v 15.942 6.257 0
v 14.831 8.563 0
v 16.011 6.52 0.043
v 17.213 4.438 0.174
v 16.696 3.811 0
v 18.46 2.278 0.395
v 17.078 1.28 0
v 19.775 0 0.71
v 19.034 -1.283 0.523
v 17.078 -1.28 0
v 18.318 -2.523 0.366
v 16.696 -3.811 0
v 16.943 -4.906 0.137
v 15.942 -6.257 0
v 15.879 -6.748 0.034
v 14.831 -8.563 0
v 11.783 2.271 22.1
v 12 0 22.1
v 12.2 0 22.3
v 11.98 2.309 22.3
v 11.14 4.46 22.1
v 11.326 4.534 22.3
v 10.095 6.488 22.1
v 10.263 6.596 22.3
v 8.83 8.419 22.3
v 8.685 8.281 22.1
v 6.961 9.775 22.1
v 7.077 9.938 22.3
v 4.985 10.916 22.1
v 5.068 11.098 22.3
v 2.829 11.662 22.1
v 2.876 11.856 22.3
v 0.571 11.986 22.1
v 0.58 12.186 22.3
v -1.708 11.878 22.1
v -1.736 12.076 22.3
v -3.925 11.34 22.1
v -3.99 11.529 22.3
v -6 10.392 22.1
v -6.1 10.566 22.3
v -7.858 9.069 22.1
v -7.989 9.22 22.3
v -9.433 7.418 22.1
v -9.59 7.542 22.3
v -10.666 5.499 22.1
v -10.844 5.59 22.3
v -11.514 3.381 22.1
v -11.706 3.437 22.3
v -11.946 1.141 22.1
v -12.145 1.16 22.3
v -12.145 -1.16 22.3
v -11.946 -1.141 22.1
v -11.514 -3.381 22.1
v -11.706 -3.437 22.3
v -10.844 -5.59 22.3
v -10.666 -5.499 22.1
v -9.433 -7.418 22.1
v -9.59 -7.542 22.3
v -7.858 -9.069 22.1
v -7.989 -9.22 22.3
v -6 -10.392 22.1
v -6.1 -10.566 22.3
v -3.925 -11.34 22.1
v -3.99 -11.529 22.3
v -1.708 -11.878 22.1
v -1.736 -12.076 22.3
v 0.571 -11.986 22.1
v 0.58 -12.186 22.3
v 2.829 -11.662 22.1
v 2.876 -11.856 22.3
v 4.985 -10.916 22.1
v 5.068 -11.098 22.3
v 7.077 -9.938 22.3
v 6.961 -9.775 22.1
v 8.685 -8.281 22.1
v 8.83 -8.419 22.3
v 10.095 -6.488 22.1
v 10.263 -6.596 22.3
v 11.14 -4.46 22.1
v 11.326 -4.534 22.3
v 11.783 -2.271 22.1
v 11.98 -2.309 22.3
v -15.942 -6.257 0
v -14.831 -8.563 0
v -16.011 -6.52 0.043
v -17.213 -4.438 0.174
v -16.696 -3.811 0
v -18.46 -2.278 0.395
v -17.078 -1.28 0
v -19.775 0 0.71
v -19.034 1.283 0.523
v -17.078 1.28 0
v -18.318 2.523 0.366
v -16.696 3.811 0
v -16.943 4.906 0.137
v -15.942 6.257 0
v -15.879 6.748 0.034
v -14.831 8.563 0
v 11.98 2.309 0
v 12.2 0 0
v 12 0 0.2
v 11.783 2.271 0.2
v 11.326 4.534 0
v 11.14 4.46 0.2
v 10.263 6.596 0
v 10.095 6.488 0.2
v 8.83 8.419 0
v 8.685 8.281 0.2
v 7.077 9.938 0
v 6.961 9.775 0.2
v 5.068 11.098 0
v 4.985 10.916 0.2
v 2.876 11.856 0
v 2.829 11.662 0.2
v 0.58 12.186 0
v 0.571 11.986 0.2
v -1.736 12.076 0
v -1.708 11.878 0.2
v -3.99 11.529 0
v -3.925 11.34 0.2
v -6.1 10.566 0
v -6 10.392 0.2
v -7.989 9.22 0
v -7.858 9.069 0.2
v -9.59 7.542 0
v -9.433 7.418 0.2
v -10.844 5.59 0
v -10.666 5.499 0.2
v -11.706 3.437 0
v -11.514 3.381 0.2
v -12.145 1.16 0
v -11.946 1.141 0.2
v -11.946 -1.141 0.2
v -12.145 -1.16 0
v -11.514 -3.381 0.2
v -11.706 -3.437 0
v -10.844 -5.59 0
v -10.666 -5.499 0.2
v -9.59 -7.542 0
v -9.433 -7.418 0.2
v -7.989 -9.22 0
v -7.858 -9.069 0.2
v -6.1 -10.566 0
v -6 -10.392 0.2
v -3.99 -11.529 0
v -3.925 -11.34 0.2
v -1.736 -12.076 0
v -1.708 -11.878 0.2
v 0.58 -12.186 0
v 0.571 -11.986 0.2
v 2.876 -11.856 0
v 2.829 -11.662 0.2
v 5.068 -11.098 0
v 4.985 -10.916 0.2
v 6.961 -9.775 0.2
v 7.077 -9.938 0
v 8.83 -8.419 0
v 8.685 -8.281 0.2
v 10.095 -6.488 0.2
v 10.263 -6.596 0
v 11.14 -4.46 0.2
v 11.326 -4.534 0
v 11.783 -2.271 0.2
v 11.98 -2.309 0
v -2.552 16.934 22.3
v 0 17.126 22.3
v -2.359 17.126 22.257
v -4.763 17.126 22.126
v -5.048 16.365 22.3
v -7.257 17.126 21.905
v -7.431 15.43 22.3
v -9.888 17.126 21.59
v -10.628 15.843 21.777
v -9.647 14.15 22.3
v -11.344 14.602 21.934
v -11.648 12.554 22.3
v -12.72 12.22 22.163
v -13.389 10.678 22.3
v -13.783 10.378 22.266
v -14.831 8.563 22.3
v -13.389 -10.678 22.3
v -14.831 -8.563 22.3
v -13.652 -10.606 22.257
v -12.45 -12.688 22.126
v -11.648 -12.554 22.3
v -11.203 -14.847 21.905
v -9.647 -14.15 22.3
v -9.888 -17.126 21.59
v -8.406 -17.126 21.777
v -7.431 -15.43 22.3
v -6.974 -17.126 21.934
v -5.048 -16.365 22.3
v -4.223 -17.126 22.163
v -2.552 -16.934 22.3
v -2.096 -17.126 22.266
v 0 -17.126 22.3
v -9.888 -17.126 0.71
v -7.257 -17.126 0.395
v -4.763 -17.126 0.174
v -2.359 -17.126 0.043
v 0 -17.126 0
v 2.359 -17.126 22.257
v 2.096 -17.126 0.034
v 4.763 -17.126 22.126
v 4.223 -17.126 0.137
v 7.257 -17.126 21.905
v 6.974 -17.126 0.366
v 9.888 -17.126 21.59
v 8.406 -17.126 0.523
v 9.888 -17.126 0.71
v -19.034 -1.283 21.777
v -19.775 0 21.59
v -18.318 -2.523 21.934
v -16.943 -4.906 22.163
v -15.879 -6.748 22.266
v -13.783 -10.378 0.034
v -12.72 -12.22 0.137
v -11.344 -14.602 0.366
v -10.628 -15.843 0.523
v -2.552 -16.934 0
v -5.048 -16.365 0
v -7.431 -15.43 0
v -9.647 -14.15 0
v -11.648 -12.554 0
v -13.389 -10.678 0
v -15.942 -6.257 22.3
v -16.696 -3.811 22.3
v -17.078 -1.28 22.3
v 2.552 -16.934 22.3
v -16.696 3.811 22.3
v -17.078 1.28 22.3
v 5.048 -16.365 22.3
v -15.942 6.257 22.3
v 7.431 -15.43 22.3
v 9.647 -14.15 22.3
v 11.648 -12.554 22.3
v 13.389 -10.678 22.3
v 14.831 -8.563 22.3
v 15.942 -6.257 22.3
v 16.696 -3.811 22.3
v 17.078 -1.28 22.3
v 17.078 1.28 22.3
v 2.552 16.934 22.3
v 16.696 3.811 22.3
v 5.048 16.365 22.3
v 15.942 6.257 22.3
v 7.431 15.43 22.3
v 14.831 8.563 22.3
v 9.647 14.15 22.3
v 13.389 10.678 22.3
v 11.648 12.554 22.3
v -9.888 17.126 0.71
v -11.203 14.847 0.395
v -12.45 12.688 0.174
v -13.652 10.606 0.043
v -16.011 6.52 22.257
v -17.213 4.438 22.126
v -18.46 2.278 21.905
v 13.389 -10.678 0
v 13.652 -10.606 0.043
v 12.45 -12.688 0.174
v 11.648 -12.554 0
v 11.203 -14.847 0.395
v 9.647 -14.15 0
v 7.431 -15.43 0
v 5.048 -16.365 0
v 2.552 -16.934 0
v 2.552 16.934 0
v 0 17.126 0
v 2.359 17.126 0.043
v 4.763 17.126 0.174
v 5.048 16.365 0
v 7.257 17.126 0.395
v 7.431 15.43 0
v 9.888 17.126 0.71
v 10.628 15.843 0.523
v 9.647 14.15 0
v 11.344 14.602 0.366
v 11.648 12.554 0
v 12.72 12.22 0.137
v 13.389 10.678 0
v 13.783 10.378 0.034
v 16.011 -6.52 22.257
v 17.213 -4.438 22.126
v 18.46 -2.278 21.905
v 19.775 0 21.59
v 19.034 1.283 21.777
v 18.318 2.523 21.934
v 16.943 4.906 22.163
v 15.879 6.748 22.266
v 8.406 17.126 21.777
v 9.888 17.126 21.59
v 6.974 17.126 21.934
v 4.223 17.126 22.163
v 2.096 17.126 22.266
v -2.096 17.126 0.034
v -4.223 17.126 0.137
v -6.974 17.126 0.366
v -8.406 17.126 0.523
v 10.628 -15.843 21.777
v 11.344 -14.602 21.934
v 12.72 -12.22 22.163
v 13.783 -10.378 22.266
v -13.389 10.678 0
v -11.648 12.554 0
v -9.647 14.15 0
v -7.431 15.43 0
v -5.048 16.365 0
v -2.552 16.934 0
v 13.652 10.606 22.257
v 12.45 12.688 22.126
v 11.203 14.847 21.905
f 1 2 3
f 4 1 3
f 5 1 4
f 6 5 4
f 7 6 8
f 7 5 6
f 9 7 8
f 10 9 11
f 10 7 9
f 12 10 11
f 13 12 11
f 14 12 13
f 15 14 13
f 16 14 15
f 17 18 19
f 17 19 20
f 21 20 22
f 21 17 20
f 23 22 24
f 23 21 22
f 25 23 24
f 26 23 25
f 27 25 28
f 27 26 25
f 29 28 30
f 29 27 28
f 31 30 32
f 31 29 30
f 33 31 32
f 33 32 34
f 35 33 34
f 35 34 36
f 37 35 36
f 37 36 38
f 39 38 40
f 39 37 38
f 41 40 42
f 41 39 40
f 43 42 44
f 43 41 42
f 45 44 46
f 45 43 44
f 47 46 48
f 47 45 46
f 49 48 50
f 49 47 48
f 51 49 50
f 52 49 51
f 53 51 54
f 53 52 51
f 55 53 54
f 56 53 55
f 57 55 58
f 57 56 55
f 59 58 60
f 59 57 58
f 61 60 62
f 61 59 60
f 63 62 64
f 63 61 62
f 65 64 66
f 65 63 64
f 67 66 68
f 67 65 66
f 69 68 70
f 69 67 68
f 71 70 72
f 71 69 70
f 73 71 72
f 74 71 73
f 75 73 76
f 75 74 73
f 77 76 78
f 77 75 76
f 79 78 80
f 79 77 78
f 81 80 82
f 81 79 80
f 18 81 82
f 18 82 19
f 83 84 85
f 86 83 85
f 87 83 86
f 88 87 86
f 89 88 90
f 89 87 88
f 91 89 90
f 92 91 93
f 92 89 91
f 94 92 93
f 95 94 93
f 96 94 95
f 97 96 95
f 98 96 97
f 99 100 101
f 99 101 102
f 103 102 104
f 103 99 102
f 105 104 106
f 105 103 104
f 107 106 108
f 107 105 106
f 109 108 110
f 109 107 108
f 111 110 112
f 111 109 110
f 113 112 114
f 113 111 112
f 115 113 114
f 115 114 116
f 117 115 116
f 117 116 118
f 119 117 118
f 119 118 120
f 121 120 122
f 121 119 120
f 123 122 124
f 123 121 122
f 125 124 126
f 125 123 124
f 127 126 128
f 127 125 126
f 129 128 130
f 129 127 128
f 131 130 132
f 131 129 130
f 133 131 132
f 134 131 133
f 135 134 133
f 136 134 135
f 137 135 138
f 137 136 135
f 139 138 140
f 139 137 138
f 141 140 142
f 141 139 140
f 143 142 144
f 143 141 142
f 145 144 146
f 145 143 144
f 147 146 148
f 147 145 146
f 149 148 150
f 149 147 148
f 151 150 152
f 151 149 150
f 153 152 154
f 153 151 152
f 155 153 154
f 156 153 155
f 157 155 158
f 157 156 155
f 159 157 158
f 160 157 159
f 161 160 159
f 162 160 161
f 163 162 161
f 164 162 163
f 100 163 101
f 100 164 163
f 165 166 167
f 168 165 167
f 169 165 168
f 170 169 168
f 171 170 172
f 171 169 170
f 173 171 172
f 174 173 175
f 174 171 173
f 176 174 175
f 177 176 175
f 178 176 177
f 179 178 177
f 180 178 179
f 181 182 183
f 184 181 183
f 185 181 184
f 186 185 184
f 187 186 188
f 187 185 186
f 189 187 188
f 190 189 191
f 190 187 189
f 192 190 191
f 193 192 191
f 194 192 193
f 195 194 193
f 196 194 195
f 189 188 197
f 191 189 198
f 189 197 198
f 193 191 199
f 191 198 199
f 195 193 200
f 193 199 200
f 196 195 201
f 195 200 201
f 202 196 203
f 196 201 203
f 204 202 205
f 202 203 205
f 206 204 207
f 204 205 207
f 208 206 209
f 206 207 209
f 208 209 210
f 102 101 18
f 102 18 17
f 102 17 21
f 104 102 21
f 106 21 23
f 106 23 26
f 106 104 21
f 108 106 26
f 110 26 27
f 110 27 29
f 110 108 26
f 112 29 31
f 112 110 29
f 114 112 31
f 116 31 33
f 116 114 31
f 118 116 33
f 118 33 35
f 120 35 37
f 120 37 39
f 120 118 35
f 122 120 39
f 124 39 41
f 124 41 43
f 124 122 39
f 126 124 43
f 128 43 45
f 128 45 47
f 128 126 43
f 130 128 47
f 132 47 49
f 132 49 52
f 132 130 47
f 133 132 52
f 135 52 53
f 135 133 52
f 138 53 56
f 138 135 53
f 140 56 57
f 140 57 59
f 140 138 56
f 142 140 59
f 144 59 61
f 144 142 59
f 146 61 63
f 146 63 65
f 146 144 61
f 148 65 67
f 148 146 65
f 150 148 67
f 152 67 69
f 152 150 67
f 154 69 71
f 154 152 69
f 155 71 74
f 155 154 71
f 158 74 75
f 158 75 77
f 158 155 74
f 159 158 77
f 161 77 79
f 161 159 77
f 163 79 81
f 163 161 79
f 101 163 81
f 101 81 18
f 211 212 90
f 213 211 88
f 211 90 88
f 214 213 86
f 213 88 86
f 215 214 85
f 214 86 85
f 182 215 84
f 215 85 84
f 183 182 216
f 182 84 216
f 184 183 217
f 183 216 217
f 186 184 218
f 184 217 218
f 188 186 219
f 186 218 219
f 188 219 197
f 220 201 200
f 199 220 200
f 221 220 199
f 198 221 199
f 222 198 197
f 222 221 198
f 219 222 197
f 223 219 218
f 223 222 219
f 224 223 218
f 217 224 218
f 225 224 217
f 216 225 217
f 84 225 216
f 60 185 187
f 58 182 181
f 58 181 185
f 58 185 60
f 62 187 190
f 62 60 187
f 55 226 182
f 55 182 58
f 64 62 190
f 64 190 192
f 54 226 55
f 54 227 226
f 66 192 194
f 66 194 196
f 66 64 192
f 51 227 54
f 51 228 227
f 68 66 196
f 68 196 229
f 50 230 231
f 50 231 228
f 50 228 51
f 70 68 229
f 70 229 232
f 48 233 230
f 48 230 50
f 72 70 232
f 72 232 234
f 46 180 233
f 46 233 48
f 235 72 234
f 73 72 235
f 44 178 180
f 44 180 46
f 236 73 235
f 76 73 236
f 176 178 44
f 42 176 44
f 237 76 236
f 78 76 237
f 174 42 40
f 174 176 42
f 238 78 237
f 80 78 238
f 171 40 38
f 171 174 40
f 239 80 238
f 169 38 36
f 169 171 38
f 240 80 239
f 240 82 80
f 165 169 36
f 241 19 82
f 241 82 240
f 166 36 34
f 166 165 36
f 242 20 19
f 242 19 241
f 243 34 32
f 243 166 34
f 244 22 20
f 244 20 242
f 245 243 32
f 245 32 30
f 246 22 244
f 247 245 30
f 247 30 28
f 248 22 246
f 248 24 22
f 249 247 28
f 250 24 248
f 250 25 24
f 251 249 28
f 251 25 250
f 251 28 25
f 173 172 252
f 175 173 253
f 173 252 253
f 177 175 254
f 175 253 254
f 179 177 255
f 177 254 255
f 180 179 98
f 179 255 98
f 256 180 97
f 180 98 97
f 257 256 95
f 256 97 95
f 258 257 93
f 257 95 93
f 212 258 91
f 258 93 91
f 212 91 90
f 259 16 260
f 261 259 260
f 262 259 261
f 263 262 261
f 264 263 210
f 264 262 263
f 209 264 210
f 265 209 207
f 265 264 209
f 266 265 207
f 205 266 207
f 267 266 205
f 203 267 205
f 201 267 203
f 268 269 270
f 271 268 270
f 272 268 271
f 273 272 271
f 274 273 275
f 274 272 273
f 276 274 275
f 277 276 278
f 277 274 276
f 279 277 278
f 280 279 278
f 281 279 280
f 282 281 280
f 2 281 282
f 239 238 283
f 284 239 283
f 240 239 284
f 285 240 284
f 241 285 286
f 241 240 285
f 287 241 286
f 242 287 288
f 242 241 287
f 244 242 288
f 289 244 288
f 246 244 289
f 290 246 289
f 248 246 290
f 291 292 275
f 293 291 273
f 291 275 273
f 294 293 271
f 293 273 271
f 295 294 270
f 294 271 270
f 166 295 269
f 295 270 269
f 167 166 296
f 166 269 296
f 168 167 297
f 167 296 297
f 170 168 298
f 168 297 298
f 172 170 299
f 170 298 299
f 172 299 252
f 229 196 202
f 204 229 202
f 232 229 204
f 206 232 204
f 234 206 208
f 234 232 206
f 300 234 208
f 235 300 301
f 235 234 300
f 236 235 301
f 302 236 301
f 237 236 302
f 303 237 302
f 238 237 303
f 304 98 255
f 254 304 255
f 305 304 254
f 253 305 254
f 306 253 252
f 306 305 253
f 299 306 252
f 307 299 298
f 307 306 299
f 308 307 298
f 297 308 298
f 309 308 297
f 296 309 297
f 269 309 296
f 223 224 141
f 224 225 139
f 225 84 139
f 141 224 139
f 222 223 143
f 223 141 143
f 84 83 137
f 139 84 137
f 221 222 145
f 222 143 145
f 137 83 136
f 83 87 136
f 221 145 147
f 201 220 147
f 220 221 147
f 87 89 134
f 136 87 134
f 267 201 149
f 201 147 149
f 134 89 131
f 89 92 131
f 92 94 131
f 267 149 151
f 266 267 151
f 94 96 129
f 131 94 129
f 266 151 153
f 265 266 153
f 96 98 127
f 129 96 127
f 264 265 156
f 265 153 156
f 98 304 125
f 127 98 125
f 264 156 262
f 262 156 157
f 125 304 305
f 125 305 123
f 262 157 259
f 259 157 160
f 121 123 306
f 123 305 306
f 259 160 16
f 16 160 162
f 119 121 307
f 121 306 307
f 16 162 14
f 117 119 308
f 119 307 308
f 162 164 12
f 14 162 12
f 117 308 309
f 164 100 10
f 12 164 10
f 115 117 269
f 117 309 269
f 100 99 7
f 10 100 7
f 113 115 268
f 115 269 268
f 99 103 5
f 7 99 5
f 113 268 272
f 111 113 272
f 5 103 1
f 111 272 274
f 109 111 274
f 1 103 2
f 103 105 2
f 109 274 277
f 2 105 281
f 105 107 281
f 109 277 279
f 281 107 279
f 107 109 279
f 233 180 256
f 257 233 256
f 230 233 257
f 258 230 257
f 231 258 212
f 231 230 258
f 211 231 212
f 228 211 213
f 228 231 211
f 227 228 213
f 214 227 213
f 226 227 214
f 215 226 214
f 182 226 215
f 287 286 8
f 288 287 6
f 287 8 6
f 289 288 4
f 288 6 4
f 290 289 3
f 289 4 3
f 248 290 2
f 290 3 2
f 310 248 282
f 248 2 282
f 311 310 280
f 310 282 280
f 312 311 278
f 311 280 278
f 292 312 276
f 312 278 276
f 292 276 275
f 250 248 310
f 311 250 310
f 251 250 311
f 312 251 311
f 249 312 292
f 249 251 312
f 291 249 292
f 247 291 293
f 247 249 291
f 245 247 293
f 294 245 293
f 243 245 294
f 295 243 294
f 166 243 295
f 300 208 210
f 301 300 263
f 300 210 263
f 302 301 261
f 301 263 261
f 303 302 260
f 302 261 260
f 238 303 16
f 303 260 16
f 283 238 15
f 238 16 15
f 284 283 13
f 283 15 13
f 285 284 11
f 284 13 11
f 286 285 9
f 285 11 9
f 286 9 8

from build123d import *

# Parameters (mm, degrees)
SKETCH_1_R          = 12
EXTRUDE_522_DEPTH   = 22.3
SKETCH_2_OUTSIDE_W  = 336.56
SKETCH_2_OUTSIDE_H  = 331.262
SKETCH_2_OUTSIDE_R  = 17.12565236
CUT_EXTRUDE_1_DEPTH = 38
CUT_EXTRUDE_1_DRAFT = -75
SKETCH_3_OUTSIDE_W  = 336.56
SKETCH_3_OUTSIDE_H  = 331.262
SKETCH_3_OUTSIDE_R  = 17.12565236
CUT_EXTRUDE_2_DEPTH = 38
CUT_EXTRUDE_2_DRAFT = -75
CHAMFER_1_SIZE      = 0.2


with BuildPart() as part:
    # 草图1 → Extrude 522 (new body)
    with BuildSketch(Plane.XY):
        Polygon((9.8875, 17.12565236), (-9.8875, 17.12565236), (-19.775, 0), (-9.8875, -17.12565236), (9.8875, -17.12565236), (19.775, 0), align=None)
        Circle(SKETCH_1_R, mode=Mode.SUBTRACT)
    extrude(amount=EXTRUDE_522_DEPTH)


with BuildPart() as cut_extrude_1_tool:
    # 草图2 outside → 切除-拉伸1 (with draft: the straight prism first)
    with BuildSketch(Plane(origin=(0, 0, 0), x_dir=(-1, 0, 0), z_dir=(0, 0, -1))):
        Rectangle(SKETCH_2_OUTSIDE_W, SKETCH_2_OUTSIDE_H)
        Circle(SKETCH_2_OUTSIDE_R, mode=Mode.SUBTRACT)
    extrude(amount=-CUT_EXTRUDE_1_DEPTH)
    # 切除-拉伸1: the draft: its side faces are tilted about the plane it starts from
    cut_extrude_1_sides = [cut_extrude_1_tool.faces().sort_by_distance(p)[0] for p in [
        (0, -165.631, 19),
        (-168.28, 0, 19),
        (0, 165.631, 19),
        (168.28, 0, 19),
        (17.12565236, 0, 19),
    ]]
    draft(cut_extrude_1_sides, Plane(origin=(0, 0, 0), x_dir=(-1, 0, 0), z_dir=(0, 0, -1)), CUT_EXTRUDE_1_DRAFT)


with BuildPart() as part_1:
    add(part.part)

    # 切除-拉伸1: cut by cut_extrude_1_tool
    add(cut_extrude_1_tool.part, mode=Mode.SUBTRACT)


with BuildPart() as cut_extrude_2_tool:
    # 草图3 outside → 切除-拉伸2 (with draft: the straight prism first)
    with BuildSketch(Plane.XY.offset(22.3)):
        Rectangle(SKETCH_3_OUTSIDE_W, SKETCH_3_OUTSIDE_H)
        Circle(SKETCH_3_OUTSIDE_R, mode=Mode.SUBTRACT)
    extrude(amount=-CUT_EXTRUDE_2_DEPTH)
    # 切除-拉伸2: the draft: its side faces are tilted about the plane it starts from
    cut_extrude_2_sides = [cut_extrude_2_tool.faces().sort_by_distance(p)[0] for p in [
        (0, -165.631, 3.3),
        (168.28, 0, 3.3),
        (0, 165.631, 3.3),
        (-168.28, 0, 3.3),
        (-17.12565236, 0, 3.3),
    ]]
    draft(cut_extrude_2_sides, Plane.XY.offset(22.3), CUT_EXTRUDE_2_DRAFT)


with BuildPart() as part_2:
    add(part_1.part)

    # 切除-拉伸2: cut by cut_extrude_2_tool
    add(cut_extrude_2_tool.part, mode=Mode.SUBTRACT)

    # 倒角1
    chamfer_1_edges = [part_2.edges().sort_by_distance(p)[0] for p in [
        (-12, 0, 0),
        (-12, 0, 22.3),
    ]]
    chamfer(chamfer_1_edges, length=CHAMFER_1_SIZE)


solid = part_2.part
